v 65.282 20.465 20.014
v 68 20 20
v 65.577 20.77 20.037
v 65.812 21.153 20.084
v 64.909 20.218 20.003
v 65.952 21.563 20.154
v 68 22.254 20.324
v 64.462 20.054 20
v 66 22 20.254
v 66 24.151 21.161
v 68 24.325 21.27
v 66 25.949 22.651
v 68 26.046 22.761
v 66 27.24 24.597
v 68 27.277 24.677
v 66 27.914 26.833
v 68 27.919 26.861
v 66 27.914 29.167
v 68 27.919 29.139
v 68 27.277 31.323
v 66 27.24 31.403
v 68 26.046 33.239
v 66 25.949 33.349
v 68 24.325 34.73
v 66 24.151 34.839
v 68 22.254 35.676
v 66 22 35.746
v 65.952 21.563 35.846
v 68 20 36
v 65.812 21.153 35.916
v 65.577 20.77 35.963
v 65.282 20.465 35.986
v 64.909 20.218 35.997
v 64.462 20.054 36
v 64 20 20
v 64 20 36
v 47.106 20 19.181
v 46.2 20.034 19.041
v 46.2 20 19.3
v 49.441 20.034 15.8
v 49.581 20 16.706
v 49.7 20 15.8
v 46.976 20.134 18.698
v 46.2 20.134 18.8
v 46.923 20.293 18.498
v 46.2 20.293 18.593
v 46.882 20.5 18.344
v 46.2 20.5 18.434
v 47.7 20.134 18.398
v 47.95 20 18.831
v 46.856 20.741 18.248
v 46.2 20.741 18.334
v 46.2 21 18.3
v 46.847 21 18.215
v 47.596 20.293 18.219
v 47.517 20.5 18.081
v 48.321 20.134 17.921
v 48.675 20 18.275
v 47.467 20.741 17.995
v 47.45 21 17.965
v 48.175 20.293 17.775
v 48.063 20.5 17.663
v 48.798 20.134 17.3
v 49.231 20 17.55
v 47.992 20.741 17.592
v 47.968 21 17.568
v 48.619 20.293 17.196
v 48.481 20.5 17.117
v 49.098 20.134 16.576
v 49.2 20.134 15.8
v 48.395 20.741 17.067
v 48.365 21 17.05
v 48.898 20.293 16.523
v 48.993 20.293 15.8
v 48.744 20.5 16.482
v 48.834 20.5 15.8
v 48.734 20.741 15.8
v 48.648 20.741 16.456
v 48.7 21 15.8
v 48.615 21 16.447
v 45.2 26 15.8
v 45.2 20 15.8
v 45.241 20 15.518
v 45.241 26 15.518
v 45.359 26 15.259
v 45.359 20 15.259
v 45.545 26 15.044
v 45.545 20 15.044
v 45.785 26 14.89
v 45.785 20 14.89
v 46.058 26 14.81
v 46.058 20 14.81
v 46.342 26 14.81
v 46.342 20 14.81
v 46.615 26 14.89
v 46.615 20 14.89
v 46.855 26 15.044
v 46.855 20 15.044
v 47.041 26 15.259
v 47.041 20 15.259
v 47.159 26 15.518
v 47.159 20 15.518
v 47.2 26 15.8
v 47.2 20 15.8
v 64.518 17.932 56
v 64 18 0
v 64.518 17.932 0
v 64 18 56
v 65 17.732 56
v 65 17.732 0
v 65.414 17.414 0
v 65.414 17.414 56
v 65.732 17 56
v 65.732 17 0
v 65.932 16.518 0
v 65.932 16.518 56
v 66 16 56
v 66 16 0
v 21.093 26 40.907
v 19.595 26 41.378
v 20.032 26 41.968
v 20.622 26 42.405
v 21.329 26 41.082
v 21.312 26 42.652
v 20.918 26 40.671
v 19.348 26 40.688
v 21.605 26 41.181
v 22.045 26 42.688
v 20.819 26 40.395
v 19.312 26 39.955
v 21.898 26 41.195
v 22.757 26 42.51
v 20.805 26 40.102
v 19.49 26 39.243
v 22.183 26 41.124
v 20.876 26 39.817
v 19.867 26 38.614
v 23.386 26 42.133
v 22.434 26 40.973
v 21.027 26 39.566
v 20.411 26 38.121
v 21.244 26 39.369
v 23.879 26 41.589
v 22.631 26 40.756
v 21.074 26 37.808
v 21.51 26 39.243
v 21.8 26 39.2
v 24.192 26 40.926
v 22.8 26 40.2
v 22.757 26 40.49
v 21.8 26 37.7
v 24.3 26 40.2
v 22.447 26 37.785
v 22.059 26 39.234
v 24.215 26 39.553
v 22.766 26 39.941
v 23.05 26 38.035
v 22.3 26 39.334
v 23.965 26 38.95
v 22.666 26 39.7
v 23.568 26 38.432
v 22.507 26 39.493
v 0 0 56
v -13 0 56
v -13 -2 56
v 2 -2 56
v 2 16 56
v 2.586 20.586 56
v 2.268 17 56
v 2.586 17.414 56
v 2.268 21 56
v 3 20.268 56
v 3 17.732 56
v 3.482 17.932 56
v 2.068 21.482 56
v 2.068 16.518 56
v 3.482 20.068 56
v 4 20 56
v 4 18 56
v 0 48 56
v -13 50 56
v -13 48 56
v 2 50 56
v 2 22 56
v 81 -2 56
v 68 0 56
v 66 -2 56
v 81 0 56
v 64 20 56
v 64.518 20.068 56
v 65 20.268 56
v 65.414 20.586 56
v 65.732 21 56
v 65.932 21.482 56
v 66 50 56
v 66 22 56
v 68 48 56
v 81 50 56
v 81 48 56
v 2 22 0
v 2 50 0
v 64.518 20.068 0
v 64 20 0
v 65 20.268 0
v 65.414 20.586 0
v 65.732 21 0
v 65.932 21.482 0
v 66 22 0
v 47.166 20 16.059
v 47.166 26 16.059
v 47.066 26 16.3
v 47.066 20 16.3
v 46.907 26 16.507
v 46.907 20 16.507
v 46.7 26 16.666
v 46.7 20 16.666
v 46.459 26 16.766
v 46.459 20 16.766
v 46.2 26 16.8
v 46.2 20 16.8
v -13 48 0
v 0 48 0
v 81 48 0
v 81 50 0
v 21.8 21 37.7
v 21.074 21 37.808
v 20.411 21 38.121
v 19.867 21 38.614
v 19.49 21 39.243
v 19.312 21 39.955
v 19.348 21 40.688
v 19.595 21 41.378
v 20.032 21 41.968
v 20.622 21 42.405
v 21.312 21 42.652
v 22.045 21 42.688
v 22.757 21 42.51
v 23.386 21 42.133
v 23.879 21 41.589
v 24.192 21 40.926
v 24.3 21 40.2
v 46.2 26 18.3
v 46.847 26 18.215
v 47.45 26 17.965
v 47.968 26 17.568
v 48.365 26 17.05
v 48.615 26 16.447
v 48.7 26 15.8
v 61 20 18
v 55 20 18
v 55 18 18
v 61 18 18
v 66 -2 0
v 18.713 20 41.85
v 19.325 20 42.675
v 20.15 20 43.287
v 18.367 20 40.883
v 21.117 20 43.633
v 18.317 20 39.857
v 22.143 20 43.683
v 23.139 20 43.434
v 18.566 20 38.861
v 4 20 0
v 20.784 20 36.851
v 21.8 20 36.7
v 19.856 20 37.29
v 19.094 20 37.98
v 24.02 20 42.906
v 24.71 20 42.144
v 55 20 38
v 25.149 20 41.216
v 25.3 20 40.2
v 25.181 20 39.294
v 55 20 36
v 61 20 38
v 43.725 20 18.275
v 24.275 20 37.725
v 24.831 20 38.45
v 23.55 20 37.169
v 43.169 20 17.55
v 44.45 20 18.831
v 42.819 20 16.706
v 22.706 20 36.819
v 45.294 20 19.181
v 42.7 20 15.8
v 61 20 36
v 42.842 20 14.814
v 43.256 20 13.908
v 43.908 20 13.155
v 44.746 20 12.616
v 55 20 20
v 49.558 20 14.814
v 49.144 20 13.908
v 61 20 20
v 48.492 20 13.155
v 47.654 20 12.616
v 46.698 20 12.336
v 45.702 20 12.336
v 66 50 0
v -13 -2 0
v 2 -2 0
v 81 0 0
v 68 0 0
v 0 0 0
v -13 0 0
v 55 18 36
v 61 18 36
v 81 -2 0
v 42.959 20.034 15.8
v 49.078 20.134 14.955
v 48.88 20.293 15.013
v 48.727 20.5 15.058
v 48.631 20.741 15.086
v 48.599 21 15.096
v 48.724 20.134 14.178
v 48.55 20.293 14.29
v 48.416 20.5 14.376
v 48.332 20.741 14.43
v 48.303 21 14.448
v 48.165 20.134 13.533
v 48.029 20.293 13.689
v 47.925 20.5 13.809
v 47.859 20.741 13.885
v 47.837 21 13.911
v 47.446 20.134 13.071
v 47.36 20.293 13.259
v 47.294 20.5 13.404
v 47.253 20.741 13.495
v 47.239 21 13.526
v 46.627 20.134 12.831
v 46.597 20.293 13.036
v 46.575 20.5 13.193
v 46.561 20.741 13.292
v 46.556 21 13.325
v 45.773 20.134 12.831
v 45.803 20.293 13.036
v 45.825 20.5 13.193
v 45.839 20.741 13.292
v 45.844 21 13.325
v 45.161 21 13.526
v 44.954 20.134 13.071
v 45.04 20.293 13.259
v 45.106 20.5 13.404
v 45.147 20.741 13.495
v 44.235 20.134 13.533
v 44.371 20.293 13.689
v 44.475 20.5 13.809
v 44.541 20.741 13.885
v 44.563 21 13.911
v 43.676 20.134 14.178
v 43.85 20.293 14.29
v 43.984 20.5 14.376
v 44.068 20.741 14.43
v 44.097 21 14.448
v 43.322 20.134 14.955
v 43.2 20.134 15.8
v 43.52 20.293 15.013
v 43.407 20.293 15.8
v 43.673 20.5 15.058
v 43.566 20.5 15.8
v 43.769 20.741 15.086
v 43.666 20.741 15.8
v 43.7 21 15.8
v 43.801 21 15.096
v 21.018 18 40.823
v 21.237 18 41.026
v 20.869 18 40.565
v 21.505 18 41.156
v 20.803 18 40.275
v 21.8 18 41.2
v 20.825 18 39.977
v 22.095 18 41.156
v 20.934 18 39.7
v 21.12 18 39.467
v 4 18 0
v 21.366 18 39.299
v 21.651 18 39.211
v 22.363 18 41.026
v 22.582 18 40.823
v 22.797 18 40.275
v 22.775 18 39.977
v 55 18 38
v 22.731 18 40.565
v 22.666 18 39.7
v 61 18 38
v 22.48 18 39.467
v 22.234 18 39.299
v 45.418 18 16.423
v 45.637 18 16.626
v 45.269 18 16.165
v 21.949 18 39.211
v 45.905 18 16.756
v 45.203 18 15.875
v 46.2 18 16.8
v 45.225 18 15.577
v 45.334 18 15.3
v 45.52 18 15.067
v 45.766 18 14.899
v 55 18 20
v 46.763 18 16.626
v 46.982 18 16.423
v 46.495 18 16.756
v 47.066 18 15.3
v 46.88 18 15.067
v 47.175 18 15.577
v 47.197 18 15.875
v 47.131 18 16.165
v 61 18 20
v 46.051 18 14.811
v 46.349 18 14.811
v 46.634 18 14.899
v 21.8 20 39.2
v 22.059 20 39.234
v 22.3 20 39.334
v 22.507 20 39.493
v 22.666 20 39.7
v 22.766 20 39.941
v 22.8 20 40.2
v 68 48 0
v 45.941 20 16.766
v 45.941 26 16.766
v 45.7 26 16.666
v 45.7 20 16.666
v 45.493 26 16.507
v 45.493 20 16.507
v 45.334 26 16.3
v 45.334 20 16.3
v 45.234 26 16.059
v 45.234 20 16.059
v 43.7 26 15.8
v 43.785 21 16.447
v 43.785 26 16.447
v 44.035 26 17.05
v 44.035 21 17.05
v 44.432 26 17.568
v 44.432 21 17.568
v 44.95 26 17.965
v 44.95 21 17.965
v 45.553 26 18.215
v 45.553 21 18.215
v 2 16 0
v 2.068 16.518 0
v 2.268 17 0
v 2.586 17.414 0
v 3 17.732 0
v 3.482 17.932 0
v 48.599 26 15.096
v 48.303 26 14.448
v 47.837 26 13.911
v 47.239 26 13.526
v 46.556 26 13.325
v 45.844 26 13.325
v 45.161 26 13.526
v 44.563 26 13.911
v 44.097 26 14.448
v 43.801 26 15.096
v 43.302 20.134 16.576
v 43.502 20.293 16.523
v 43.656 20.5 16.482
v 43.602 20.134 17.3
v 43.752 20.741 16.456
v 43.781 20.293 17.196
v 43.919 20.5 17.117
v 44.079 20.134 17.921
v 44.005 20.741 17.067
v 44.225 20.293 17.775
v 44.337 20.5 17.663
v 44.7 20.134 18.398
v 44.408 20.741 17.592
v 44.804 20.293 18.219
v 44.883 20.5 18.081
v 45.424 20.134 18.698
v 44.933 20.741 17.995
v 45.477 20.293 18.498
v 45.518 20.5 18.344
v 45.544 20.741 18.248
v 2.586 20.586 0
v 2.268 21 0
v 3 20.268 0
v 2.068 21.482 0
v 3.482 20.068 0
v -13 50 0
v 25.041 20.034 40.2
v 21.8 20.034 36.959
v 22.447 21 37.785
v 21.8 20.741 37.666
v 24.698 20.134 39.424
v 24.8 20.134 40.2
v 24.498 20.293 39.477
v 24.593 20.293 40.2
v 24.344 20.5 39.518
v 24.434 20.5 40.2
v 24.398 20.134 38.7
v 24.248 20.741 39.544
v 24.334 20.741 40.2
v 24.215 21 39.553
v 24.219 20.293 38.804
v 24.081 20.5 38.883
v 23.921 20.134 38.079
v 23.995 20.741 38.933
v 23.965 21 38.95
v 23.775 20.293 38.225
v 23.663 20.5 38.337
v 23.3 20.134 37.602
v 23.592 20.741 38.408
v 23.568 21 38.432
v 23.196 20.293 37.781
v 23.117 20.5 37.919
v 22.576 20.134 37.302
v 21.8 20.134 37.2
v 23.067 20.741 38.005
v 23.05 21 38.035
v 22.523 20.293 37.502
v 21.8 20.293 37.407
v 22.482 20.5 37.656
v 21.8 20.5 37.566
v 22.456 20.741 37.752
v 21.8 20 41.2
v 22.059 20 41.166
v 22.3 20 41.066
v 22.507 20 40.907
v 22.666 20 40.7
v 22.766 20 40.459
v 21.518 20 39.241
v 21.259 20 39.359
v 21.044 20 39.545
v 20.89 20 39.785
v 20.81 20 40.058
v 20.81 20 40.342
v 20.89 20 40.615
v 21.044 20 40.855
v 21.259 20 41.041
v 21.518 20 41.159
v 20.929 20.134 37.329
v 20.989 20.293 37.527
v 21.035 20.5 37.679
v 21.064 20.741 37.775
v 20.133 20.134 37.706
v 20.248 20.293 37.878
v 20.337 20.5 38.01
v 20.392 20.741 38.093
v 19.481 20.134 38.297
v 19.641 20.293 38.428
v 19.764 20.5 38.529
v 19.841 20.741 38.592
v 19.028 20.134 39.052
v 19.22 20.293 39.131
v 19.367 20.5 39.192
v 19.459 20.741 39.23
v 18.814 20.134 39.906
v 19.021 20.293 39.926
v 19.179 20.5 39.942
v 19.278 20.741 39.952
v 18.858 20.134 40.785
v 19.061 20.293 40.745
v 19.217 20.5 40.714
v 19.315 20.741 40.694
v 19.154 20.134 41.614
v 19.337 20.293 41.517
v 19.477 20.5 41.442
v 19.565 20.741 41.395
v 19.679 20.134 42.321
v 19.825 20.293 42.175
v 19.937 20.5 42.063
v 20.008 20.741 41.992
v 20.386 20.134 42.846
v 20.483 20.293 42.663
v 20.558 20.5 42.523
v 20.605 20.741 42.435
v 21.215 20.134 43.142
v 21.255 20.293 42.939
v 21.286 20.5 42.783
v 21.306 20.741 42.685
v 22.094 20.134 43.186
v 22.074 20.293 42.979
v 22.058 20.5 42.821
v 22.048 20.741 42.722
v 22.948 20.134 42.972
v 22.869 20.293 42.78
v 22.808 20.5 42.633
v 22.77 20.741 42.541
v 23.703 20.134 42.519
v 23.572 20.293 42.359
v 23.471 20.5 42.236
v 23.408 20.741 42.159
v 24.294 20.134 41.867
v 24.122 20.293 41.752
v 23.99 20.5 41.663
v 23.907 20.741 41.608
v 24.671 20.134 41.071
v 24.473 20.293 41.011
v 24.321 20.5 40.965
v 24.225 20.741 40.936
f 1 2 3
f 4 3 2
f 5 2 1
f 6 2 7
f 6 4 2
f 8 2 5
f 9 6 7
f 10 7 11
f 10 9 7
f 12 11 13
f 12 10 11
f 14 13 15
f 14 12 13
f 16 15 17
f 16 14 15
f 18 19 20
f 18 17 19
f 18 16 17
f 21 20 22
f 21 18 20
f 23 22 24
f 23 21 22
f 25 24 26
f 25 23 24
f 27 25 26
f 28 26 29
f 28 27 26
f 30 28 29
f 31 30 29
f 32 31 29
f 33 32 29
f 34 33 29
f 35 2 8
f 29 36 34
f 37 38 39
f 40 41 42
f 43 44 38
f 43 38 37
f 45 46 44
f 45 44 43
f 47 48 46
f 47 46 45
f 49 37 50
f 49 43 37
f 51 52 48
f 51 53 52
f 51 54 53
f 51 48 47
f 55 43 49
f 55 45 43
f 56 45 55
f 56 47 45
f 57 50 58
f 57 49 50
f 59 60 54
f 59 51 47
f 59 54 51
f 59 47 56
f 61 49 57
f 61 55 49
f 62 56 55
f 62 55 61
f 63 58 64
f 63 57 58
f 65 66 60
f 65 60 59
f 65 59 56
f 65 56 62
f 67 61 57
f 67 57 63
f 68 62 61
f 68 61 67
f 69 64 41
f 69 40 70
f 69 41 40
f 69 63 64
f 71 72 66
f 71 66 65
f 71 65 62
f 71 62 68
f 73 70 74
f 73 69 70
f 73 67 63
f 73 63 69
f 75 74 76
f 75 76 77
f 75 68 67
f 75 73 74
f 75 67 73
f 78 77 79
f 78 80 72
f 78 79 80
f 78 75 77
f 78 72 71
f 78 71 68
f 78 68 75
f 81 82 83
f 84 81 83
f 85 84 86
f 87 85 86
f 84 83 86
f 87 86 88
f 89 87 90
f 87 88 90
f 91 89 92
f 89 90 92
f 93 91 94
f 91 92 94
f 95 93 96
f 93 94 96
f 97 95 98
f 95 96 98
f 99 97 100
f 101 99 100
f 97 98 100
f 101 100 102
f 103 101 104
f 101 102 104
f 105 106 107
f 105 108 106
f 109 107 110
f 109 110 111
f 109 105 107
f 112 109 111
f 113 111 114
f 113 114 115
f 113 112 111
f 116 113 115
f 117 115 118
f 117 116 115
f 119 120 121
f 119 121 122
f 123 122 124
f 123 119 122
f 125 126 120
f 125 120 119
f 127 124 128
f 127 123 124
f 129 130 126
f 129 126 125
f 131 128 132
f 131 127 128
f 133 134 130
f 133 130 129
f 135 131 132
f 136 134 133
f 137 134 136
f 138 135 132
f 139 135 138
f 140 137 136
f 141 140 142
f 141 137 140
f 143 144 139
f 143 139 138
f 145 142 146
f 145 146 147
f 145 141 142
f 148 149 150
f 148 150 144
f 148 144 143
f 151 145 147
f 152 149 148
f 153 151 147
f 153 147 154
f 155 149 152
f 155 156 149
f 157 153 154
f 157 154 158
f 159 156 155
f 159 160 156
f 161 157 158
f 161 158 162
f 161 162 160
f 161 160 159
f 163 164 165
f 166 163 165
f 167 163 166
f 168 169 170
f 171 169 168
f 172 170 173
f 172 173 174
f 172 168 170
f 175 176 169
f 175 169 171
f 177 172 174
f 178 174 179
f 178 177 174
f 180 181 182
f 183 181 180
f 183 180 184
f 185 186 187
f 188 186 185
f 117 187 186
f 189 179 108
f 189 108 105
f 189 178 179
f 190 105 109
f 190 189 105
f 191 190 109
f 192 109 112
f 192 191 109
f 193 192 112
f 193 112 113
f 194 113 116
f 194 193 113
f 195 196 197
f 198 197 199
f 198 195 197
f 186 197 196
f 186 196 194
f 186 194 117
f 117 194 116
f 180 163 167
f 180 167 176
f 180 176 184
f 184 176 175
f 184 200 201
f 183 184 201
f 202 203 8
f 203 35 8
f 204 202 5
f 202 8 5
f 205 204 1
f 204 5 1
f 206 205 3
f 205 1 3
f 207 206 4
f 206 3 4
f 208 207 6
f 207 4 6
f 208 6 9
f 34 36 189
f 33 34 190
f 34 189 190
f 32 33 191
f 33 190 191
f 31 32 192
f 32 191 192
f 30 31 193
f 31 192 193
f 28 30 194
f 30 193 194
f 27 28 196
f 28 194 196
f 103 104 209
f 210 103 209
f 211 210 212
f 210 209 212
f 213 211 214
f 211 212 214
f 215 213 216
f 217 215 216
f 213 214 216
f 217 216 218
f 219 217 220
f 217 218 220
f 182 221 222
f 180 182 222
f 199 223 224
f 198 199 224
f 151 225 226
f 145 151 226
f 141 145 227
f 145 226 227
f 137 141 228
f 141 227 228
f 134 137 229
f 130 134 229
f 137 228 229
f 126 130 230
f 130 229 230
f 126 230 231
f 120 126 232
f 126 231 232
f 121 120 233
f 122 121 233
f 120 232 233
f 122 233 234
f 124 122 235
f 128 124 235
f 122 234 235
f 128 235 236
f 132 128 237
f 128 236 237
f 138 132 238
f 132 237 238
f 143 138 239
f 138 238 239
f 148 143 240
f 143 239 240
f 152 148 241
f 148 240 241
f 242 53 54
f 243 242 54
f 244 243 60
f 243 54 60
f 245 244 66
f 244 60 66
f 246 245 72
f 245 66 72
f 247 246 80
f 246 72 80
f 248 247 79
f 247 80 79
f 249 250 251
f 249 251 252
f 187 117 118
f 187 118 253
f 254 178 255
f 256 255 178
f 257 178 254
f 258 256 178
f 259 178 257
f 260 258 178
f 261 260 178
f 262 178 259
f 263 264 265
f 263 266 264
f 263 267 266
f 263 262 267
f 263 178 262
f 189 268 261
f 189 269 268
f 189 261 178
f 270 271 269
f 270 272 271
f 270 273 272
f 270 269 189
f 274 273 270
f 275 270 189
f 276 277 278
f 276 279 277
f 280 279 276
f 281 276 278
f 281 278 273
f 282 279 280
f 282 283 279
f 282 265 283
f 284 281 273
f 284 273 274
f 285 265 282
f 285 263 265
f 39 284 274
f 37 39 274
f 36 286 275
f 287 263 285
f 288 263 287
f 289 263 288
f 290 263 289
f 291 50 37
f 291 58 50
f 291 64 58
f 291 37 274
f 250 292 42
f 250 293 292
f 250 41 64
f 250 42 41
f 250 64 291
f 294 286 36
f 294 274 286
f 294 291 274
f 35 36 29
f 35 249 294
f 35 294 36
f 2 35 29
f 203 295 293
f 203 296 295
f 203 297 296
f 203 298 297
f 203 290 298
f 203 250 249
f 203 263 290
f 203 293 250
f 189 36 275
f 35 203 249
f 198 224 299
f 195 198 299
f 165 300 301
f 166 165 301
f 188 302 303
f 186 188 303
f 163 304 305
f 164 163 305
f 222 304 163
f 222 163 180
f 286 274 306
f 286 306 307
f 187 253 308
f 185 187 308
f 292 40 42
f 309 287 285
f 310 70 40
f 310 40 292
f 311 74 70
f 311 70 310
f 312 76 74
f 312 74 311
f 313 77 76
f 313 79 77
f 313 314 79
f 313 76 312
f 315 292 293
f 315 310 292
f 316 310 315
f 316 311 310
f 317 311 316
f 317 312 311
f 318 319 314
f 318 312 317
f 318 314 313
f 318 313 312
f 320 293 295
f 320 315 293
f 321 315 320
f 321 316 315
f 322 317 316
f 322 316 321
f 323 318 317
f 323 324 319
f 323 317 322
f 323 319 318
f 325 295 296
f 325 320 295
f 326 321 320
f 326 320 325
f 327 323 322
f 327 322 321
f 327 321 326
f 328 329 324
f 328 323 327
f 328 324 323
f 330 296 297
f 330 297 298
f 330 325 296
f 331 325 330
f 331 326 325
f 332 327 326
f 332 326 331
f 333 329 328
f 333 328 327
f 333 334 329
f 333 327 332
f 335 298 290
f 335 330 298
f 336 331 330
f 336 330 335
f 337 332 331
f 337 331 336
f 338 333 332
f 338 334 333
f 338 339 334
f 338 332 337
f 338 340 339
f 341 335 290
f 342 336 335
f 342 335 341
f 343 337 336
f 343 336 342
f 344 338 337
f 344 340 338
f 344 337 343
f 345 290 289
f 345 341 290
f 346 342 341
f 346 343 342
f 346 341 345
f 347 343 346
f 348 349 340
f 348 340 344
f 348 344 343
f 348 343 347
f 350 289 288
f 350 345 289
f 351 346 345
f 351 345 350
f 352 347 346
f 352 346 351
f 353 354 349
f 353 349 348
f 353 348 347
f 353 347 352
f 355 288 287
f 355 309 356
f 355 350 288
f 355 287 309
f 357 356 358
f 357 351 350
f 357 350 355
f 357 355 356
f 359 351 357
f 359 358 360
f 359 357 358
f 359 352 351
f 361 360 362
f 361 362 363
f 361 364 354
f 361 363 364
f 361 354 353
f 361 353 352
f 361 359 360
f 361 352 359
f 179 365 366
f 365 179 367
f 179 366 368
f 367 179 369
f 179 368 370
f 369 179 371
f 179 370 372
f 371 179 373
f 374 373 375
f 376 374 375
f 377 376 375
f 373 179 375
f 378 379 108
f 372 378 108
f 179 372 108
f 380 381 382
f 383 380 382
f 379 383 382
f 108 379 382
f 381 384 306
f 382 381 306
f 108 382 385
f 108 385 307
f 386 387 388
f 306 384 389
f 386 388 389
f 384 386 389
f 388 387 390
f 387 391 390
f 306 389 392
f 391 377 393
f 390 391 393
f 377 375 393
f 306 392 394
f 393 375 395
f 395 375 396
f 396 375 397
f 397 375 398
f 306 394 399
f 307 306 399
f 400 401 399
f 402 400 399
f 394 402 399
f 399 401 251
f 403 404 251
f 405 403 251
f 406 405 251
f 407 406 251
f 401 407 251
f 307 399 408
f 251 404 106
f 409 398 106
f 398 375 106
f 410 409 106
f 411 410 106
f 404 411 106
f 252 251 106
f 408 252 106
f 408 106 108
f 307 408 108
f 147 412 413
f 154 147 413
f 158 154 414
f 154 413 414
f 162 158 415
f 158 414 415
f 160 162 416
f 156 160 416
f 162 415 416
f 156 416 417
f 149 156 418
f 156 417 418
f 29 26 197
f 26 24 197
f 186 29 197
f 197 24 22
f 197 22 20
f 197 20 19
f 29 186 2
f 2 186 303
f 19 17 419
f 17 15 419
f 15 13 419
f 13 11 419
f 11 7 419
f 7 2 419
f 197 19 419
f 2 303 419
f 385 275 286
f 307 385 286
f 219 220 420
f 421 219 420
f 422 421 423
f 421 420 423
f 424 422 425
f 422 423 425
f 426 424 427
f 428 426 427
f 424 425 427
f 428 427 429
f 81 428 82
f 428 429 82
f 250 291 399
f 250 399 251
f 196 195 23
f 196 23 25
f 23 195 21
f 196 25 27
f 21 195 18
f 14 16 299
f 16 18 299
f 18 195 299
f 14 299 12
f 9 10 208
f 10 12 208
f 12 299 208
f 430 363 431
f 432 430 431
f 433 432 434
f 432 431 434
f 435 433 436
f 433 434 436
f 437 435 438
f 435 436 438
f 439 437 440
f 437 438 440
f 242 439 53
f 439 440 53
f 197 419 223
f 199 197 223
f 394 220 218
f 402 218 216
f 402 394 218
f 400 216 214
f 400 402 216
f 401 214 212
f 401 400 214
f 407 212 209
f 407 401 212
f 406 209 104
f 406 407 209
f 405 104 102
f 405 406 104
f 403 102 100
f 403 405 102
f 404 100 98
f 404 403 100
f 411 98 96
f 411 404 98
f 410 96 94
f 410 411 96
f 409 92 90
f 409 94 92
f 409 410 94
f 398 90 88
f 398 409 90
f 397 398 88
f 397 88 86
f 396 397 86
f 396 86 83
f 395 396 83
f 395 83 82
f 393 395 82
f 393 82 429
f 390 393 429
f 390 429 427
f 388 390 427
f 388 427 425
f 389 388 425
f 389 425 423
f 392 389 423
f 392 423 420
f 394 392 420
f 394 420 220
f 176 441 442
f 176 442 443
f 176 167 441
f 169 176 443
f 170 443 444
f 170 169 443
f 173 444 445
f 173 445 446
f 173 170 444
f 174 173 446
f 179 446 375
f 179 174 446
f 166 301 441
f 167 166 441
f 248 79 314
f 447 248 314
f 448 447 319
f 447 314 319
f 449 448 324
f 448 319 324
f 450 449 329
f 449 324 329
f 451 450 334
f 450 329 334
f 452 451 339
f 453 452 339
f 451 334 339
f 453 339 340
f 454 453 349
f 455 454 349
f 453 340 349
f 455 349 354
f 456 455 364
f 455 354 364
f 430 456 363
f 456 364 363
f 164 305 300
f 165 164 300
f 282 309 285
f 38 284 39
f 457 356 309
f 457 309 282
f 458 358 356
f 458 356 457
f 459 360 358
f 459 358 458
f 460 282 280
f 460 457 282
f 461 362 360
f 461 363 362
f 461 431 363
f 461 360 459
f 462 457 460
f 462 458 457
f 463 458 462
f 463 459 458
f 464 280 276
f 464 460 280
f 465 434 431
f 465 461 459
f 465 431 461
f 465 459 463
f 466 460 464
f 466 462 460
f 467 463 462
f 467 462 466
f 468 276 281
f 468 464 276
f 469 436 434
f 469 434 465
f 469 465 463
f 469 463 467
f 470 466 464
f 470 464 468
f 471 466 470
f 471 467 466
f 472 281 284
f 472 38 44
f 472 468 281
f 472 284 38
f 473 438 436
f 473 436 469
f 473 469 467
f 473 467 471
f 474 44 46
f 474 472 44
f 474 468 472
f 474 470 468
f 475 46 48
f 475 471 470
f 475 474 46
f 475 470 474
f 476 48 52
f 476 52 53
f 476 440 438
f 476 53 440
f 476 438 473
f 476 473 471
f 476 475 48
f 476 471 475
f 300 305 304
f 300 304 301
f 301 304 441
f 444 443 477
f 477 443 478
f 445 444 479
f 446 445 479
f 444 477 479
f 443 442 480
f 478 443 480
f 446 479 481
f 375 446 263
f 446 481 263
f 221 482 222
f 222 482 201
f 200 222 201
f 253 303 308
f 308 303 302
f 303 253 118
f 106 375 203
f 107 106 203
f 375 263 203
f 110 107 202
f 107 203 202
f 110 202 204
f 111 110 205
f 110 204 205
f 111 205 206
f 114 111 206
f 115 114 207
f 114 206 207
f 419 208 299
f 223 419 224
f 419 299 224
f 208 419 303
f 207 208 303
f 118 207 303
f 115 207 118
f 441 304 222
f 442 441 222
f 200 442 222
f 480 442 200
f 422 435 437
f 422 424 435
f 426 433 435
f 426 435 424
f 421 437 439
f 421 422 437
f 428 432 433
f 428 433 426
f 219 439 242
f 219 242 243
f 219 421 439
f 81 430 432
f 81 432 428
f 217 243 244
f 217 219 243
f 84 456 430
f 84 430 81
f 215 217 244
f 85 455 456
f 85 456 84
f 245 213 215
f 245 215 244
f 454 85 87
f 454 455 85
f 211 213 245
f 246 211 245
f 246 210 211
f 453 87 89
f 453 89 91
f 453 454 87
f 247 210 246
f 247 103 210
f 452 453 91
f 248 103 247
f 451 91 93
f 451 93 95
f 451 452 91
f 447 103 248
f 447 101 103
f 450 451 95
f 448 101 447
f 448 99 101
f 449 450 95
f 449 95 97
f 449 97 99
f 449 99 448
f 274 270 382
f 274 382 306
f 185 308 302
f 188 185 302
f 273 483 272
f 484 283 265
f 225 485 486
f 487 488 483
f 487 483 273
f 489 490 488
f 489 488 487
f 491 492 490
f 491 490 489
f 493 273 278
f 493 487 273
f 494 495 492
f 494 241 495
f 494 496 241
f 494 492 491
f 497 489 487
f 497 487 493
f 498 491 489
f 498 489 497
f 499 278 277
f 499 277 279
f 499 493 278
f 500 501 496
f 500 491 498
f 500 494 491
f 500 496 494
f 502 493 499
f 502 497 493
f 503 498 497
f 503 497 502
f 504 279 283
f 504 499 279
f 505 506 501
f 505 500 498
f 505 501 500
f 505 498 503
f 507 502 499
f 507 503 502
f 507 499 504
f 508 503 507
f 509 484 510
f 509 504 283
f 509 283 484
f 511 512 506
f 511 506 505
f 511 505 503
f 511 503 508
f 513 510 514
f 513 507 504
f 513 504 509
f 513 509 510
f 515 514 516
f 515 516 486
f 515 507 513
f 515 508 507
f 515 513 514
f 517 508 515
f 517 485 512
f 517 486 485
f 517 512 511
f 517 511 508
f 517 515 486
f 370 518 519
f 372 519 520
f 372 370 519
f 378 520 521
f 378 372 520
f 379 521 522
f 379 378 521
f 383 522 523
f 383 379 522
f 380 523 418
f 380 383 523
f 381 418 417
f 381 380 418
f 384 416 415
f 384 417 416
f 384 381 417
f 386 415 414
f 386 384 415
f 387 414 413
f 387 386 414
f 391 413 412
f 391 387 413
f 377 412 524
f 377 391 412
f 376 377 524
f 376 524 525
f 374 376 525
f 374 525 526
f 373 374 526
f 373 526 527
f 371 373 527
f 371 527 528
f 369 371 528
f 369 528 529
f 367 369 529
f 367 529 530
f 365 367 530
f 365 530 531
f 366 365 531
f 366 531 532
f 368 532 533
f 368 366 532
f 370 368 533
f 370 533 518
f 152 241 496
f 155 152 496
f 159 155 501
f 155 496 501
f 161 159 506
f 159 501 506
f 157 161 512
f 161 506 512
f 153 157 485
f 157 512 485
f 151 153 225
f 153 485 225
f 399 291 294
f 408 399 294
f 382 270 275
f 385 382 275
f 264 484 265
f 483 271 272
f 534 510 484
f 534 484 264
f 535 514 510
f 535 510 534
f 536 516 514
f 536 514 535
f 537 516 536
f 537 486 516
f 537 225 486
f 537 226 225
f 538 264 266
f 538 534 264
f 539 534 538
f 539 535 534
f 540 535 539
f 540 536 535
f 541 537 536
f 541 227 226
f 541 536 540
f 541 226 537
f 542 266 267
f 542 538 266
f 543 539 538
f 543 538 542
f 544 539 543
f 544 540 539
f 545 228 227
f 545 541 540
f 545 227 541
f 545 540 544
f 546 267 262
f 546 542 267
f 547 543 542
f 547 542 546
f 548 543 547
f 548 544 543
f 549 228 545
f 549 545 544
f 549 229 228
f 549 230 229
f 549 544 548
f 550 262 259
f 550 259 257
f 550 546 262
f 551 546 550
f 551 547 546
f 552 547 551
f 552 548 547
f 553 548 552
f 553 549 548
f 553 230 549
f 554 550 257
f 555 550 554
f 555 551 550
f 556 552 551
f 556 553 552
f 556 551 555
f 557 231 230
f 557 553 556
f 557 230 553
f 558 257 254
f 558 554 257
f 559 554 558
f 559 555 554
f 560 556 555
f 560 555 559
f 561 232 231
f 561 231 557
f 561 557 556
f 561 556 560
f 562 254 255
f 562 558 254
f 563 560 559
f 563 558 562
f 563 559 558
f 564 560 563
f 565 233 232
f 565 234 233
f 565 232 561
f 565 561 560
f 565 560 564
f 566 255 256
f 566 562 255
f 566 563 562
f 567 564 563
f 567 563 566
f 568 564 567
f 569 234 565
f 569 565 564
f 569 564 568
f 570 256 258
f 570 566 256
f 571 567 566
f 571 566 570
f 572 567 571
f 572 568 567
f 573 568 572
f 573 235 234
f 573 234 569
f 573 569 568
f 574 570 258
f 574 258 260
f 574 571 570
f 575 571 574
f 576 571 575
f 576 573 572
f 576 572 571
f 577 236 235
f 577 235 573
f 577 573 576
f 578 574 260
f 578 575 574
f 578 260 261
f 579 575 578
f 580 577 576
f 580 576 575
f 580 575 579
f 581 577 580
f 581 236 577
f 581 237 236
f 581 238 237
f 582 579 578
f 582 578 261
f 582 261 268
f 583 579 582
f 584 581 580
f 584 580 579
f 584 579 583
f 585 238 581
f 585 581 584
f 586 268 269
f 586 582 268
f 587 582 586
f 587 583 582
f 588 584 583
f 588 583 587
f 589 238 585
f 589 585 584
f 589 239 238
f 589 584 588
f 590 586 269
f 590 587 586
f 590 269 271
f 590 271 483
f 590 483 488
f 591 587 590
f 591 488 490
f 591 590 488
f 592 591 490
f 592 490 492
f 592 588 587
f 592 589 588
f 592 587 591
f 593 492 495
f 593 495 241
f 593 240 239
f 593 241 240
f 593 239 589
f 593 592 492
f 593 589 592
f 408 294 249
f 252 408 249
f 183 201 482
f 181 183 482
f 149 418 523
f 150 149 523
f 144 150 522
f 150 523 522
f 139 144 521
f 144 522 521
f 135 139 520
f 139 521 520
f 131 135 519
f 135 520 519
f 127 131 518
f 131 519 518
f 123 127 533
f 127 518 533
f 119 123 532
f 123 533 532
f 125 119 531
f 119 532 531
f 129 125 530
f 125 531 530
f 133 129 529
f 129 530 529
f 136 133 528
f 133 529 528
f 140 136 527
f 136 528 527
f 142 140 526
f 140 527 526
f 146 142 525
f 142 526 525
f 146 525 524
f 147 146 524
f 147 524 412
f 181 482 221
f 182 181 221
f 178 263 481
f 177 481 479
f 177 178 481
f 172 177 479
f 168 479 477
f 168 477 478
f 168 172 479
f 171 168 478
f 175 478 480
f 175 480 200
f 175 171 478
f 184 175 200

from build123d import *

# Parameters (mm, degrees)
BOSS_EXTRUDE2_DEPTH = 56
SKETCH2_R           = 2.5
SKETCH2_R_2         = 1
BOSS_EXTRUDE3_DEPTH = 6
CUT_EXTRUDE1_START  = -31
SKETCH3_R           = 1
CUT_EXTRUDE1_DEPTH  = 31
SKETCH2_3_W         = 6
SKETCH2_3_H         = 2
CUT_EXTRUDE2_DEPTH  = 31
CUT_EXTRUDE3_DEPTH  = 31
FILLET1_R           = 1
FILLET2_R           = 2


with BuildPart() as part:
    # Sketch1 → Boss-Extrude2 (new body)
    with BuildSketch(Plane.XY):
        Polygon((0, 48), (0, 0), (-13, 0), (-13, -2), (2, -2), (2, 18), (66, 18), (66, -2), (81, -2), (81, 0), (68, 0), (68, 48), (81, 48), (81, 50), (66, 50), (66, 20), (2, 20), (2, 50), (-13, 50), (-13, 48), align=None)
    extrude(amount=BOSS_EXTRUDE2_DEPTH)

    # Sketch2 → Boss-Extrude3 (add)
    # profile 1 of 2: a face of its own
    with BuildSketch(Plane(origin=(0, 20, 0), x_dir=(1, 0, 0), z_dir=(0, 1, 0))):
        with Locations((46.2, -15.8)):
            Circle(SKETCH2_R)
        with Locations((46.2, -15.8)):
            Circle(SKETCH2_R_2, mode=Mode.SUBTRACT)
    # profile 2 of 2: a face of its own
    with BuildSketch(Plane(origin=(0, 20, 0), x_dir=(1, 0, 0), z_dir=(0, 1, 0))):
        with Locations((21.8, -40.2)):
            Circle(SKETCH2_R)
        with Locations((21.8, -40.2)):
            Circle(SKETCH2_R_2, mode=Mode.SUBTRACT)
    extrude(amount=BOSS_EXTRUDE3_DEPTH)

    # Sketch3 → Cut-Extrude1 (cut)
    with BuildSketch(Plane(origin=(0, 20, 0), x_dir=(1, 0, 0), z_dir=(0, 1, 0)).offset(CUT_EXTRUDE1_START)):
        with Locations((46.2, -15.8)):
            Circle(SKETCH3_R)
        with Locations((21.8, -40.2)):
            Circle(SKETCH3_R)
    extrude(amount=CUT_EXTRUDE1_DEPTH, mode=Mode.SUBTRACT)

    # Sketch2<3> → Cut-Extrude2 (cut)
    with BuildSketch(Plane(origin=(0, 20, 0), x_dir=(1, 0, 0), z_dir=(0, 1, 0))):
        with Locations((58, -19)):
            Rectangle(SKETCH2_3_W, SKETCH2_3_H)
        with Locations((58, -37)):
            Rectangle(SKETCH2_3_W, SKETCH2_3_H)
    extrude(amount=-CUT_EXTRUDE2_DEPTH, mode=Mode.SUBTRACT)

    # Sketch6 → Cut-Extrude3 (cut)
    with BuildSketch(Plane.ZY.offset(-66)):
        with BuildLine():
            Line((35.999989218, 20), (20.000010782, 20))
            ThreePointArc((20.000010782, 20), (28, 27.999989218), (35.999989218, 20))
        make_face()
    extrude(amount=-CUT_EXTRUDE3_DEPTH, mode=Mode.SUBTRACT)

    # Fillet1
    fillet1_edges = [part.edges().sort_by_distance(p)[0] for p in [
        (19.3, 20, 40.2),
        (43.7, 20, 15.8),
    ]]
    fillet(fillet1_edges, radius=FILLET1_R)

    # Fillet2
    fillet2_edges = [part.edges().sort_by_distance(p)[0] for p in [
        (2, 18, 28),
        (66, 18, 28),
        (2, 20, 28),
        (66, 20, 45.999994609),
        (66, 20, 10.000005391),
    ]]
    fillet(fillet2_edges, radius=FILLET2_R)


solid = part.part
